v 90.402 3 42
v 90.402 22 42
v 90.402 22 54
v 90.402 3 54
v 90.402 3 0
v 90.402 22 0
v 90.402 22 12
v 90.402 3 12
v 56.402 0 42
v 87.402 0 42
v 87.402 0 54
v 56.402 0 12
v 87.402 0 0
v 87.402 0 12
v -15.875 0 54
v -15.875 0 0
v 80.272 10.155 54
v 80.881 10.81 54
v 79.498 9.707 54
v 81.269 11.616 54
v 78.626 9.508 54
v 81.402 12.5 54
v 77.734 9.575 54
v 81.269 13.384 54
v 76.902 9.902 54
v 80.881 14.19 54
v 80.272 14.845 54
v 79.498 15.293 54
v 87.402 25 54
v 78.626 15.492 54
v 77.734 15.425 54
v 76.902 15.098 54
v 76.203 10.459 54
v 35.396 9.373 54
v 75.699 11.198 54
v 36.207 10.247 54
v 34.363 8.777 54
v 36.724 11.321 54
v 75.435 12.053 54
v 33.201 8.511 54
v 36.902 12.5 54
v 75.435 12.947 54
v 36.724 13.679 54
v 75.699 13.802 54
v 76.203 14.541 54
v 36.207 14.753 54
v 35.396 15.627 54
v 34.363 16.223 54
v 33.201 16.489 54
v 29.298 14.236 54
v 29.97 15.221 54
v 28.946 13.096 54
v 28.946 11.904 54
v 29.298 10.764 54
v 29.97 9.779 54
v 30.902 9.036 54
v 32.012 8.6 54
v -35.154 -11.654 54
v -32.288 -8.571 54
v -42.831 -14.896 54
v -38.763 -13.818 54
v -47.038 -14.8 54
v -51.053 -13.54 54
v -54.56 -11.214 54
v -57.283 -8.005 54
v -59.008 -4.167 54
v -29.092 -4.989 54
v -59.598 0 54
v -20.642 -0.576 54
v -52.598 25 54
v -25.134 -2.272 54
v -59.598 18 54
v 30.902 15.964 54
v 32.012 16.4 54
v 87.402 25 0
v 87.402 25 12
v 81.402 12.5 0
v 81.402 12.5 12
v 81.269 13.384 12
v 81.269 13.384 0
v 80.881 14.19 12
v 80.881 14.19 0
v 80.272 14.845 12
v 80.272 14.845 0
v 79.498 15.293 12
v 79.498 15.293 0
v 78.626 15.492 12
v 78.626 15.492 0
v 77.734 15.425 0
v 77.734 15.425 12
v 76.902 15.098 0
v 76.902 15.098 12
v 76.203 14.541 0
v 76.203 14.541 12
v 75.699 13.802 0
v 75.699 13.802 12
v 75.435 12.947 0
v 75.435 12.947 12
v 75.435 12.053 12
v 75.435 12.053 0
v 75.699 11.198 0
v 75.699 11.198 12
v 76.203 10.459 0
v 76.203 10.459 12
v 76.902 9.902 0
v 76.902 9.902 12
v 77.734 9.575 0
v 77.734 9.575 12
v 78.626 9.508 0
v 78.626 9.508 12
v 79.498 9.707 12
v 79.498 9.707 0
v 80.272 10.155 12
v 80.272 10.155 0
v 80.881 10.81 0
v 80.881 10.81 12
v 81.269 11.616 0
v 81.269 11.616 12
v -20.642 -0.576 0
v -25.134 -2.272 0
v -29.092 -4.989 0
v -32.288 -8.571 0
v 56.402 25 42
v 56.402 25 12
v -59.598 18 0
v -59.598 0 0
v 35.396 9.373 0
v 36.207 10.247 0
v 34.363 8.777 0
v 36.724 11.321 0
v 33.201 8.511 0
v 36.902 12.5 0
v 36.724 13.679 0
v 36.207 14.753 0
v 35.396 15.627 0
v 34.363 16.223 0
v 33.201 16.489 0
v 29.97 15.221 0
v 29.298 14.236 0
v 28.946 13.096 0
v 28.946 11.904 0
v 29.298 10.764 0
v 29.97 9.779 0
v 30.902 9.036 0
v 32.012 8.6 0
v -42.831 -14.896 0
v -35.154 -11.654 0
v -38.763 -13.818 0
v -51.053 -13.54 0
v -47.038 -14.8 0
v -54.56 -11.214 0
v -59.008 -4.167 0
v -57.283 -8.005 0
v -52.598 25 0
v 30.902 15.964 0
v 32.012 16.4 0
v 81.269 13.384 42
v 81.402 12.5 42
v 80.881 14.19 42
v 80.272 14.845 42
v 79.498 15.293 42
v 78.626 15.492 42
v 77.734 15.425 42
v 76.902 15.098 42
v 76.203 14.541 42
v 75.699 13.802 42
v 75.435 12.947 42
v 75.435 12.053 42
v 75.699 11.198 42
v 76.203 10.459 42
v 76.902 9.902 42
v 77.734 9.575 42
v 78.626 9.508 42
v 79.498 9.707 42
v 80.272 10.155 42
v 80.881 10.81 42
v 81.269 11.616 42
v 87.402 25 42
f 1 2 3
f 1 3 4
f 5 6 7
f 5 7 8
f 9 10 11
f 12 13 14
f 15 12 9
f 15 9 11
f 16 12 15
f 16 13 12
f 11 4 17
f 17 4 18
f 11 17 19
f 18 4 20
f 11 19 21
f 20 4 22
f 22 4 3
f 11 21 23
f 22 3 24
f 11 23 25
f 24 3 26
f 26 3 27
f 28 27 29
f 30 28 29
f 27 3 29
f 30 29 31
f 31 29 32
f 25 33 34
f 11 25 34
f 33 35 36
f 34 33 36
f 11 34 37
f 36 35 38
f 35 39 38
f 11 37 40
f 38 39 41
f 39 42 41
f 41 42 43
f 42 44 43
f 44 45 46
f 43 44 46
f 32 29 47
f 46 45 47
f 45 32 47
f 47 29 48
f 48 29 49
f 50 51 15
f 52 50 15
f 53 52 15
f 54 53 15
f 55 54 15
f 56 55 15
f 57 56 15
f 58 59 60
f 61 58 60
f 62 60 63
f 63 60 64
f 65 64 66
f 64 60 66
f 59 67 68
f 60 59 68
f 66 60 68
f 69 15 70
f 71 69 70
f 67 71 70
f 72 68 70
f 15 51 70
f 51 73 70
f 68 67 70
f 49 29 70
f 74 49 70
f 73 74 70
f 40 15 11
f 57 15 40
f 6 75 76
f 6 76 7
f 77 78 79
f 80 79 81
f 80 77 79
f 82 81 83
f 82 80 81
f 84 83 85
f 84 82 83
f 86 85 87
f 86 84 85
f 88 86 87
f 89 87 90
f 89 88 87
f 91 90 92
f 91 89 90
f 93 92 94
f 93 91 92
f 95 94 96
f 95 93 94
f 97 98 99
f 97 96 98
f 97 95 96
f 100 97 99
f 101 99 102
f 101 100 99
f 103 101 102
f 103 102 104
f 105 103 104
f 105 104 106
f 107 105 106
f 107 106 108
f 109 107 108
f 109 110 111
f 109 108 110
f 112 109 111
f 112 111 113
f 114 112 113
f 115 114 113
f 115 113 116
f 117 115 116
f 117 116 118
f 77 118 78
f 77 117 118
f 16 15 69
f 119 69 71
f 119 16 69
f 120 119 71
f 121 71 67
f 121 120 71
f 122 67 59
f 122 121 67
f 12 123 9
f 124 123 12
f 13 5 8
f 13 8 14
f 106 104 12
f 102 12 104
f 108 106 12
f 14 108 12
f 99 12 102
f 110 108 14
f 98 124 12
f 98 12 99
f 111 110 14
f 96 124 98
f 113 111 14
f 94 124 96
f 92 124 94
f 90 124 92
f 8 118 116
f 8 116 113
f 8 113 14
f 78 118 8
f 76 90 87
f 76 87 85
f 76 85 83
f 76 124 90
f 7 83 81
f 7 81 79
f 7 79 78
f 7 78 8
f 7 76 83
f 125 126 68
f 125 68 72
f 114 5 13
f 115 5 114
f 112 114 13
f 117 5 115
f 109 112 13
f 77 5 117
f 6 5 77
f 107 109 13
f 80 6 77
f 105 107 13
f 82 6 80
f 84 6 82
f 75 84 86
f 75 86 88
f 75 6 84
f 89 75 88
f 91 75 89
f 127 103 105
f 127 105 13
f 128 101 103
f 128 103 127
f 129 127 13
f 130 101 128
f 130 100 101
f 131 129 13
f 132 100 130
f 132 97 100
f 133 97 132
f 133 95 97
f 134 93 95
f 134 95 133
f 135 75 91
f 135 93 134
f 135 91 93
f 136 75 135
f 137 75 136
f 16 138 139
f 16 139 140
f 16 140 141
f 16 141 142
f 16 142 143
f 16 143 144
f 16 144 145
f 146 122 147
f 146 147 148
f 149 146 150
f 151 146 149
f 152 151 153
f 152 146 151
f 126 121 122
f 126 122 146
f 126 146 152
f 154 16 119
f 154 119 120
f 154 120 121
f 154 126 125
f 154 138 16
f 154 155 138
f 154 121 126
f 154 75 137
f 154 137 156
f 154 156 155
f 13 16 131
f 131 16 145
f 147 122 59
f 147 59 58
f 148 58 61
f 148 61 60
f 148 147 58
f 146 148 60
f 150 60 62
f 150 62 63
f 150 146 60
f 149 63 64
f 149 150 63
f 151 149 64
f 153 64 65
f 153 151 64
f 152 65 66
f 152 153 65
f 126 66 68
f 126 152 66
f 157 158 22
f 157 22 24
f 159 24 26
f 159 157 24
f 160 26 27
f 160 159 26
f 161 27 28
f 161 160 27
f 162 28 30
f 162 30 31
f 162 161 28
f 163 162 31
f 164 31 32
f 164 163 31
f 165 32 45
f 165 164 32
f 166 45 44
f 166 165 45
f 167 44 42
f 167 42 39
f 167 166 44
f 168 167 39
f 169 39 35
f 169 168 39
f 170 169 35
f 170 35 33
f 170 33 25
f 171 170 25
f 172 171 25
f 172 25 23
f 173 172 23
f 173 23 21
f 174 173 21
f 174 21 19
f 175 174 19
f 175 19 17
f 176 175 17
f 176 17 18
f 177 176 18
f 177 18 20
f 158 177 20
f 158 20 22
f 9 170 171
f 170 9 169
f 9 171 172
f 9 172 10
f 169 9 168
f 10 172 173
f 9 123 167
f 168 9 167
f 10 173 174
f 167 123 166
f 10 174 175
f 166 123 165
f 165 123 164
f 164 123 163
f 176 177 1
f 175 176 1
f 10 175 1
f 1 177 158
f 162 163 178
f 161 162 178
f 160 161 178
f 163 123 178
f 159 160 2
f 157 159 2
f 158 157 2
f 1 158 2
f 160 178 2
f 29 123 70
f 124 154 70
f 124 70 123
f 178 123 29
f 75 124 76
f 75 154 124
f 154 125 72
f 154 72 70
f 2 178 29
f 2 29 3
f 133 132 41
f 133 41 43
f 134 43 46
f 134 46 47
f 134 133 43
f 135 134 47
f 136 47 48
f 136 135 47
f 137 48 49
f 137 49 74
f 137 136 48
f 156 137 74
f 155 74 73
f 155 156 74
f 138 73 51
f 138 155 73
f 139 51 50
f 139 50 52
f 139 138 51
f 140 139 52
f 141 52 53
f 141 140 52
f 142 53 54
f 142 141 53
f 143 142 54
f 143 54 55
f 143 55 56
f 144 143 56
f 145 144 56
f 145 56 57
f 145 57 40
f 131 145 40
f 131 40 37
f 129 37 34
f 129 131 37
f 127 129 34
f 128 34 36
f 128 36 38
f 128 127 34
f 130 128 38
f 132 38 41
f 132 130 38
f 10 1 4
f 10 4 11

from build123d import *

# Parameters (mm, degrees)
SKETCH1_R           = 3
SKETCH1_R_2         = 4
BOSS_EXTRUDE1_DEPTH = 54
SKETCH2_W           = 34
SKETCH2_H           = 30
CUT_EXTRUDE1_DEPTH  = 54


with BuildPart() as part:
    # Sketch1 → Boss-Extrude1 (new body)
    with BuildSketch(Plane.XY):
        with BuildLine():
            Line((-59.598214286, 18), (-52.598214286, 25))
            Line((-52.598214286, 25), (87.401785714, 25))
            Line((87.401785714, 25), (90.401785714, 22))
            Line((90.401785714, 22), (90.401785714, 3))
            Line((90.401785714, 3), (87.401785714, 0))
            Line((87.401785714, 0), (-15.875401053, 0))
            ThreePointArc((-15.875401053, 0), (-25.133602051, -2.271894791), (-32.288437186, -8.571428571))
            ThreePointArc((-32.288437186, -8.571428571), (-49.090059313, -14.311650088), (-59.598214286, 0))
            Line((-59.598214286, 0), (-59.598214286, 18))
        make_face()
        with Locations((78.401785714, 12.5)):
            Circle(SKETCH1_R, mode=Mode.SUBTRACT)
        with Locations((32.901785714, 12.5)):
            Circle(SKETCH1_R_2, mode=Mode.SUBTRACT)
    extrude(amount=BOSS_EXTRUDE1_DEPTH)

    # Sketch2 → Cut-Extrude1 (cut)
    with BuildSketch(Plane(origin=(0, 25, 0), x_dir=(1, 0, 0), z_dir=(0, 1, 0))):
        with Locations((73.401785714, -27)):
            Rectangle(SKETCH2_W, SKETCH2_H)
    extrude(amount=-CUT_EXTRUDE1_DEPTH, mode=Mode.SUBTRACT)


solid = part.part
